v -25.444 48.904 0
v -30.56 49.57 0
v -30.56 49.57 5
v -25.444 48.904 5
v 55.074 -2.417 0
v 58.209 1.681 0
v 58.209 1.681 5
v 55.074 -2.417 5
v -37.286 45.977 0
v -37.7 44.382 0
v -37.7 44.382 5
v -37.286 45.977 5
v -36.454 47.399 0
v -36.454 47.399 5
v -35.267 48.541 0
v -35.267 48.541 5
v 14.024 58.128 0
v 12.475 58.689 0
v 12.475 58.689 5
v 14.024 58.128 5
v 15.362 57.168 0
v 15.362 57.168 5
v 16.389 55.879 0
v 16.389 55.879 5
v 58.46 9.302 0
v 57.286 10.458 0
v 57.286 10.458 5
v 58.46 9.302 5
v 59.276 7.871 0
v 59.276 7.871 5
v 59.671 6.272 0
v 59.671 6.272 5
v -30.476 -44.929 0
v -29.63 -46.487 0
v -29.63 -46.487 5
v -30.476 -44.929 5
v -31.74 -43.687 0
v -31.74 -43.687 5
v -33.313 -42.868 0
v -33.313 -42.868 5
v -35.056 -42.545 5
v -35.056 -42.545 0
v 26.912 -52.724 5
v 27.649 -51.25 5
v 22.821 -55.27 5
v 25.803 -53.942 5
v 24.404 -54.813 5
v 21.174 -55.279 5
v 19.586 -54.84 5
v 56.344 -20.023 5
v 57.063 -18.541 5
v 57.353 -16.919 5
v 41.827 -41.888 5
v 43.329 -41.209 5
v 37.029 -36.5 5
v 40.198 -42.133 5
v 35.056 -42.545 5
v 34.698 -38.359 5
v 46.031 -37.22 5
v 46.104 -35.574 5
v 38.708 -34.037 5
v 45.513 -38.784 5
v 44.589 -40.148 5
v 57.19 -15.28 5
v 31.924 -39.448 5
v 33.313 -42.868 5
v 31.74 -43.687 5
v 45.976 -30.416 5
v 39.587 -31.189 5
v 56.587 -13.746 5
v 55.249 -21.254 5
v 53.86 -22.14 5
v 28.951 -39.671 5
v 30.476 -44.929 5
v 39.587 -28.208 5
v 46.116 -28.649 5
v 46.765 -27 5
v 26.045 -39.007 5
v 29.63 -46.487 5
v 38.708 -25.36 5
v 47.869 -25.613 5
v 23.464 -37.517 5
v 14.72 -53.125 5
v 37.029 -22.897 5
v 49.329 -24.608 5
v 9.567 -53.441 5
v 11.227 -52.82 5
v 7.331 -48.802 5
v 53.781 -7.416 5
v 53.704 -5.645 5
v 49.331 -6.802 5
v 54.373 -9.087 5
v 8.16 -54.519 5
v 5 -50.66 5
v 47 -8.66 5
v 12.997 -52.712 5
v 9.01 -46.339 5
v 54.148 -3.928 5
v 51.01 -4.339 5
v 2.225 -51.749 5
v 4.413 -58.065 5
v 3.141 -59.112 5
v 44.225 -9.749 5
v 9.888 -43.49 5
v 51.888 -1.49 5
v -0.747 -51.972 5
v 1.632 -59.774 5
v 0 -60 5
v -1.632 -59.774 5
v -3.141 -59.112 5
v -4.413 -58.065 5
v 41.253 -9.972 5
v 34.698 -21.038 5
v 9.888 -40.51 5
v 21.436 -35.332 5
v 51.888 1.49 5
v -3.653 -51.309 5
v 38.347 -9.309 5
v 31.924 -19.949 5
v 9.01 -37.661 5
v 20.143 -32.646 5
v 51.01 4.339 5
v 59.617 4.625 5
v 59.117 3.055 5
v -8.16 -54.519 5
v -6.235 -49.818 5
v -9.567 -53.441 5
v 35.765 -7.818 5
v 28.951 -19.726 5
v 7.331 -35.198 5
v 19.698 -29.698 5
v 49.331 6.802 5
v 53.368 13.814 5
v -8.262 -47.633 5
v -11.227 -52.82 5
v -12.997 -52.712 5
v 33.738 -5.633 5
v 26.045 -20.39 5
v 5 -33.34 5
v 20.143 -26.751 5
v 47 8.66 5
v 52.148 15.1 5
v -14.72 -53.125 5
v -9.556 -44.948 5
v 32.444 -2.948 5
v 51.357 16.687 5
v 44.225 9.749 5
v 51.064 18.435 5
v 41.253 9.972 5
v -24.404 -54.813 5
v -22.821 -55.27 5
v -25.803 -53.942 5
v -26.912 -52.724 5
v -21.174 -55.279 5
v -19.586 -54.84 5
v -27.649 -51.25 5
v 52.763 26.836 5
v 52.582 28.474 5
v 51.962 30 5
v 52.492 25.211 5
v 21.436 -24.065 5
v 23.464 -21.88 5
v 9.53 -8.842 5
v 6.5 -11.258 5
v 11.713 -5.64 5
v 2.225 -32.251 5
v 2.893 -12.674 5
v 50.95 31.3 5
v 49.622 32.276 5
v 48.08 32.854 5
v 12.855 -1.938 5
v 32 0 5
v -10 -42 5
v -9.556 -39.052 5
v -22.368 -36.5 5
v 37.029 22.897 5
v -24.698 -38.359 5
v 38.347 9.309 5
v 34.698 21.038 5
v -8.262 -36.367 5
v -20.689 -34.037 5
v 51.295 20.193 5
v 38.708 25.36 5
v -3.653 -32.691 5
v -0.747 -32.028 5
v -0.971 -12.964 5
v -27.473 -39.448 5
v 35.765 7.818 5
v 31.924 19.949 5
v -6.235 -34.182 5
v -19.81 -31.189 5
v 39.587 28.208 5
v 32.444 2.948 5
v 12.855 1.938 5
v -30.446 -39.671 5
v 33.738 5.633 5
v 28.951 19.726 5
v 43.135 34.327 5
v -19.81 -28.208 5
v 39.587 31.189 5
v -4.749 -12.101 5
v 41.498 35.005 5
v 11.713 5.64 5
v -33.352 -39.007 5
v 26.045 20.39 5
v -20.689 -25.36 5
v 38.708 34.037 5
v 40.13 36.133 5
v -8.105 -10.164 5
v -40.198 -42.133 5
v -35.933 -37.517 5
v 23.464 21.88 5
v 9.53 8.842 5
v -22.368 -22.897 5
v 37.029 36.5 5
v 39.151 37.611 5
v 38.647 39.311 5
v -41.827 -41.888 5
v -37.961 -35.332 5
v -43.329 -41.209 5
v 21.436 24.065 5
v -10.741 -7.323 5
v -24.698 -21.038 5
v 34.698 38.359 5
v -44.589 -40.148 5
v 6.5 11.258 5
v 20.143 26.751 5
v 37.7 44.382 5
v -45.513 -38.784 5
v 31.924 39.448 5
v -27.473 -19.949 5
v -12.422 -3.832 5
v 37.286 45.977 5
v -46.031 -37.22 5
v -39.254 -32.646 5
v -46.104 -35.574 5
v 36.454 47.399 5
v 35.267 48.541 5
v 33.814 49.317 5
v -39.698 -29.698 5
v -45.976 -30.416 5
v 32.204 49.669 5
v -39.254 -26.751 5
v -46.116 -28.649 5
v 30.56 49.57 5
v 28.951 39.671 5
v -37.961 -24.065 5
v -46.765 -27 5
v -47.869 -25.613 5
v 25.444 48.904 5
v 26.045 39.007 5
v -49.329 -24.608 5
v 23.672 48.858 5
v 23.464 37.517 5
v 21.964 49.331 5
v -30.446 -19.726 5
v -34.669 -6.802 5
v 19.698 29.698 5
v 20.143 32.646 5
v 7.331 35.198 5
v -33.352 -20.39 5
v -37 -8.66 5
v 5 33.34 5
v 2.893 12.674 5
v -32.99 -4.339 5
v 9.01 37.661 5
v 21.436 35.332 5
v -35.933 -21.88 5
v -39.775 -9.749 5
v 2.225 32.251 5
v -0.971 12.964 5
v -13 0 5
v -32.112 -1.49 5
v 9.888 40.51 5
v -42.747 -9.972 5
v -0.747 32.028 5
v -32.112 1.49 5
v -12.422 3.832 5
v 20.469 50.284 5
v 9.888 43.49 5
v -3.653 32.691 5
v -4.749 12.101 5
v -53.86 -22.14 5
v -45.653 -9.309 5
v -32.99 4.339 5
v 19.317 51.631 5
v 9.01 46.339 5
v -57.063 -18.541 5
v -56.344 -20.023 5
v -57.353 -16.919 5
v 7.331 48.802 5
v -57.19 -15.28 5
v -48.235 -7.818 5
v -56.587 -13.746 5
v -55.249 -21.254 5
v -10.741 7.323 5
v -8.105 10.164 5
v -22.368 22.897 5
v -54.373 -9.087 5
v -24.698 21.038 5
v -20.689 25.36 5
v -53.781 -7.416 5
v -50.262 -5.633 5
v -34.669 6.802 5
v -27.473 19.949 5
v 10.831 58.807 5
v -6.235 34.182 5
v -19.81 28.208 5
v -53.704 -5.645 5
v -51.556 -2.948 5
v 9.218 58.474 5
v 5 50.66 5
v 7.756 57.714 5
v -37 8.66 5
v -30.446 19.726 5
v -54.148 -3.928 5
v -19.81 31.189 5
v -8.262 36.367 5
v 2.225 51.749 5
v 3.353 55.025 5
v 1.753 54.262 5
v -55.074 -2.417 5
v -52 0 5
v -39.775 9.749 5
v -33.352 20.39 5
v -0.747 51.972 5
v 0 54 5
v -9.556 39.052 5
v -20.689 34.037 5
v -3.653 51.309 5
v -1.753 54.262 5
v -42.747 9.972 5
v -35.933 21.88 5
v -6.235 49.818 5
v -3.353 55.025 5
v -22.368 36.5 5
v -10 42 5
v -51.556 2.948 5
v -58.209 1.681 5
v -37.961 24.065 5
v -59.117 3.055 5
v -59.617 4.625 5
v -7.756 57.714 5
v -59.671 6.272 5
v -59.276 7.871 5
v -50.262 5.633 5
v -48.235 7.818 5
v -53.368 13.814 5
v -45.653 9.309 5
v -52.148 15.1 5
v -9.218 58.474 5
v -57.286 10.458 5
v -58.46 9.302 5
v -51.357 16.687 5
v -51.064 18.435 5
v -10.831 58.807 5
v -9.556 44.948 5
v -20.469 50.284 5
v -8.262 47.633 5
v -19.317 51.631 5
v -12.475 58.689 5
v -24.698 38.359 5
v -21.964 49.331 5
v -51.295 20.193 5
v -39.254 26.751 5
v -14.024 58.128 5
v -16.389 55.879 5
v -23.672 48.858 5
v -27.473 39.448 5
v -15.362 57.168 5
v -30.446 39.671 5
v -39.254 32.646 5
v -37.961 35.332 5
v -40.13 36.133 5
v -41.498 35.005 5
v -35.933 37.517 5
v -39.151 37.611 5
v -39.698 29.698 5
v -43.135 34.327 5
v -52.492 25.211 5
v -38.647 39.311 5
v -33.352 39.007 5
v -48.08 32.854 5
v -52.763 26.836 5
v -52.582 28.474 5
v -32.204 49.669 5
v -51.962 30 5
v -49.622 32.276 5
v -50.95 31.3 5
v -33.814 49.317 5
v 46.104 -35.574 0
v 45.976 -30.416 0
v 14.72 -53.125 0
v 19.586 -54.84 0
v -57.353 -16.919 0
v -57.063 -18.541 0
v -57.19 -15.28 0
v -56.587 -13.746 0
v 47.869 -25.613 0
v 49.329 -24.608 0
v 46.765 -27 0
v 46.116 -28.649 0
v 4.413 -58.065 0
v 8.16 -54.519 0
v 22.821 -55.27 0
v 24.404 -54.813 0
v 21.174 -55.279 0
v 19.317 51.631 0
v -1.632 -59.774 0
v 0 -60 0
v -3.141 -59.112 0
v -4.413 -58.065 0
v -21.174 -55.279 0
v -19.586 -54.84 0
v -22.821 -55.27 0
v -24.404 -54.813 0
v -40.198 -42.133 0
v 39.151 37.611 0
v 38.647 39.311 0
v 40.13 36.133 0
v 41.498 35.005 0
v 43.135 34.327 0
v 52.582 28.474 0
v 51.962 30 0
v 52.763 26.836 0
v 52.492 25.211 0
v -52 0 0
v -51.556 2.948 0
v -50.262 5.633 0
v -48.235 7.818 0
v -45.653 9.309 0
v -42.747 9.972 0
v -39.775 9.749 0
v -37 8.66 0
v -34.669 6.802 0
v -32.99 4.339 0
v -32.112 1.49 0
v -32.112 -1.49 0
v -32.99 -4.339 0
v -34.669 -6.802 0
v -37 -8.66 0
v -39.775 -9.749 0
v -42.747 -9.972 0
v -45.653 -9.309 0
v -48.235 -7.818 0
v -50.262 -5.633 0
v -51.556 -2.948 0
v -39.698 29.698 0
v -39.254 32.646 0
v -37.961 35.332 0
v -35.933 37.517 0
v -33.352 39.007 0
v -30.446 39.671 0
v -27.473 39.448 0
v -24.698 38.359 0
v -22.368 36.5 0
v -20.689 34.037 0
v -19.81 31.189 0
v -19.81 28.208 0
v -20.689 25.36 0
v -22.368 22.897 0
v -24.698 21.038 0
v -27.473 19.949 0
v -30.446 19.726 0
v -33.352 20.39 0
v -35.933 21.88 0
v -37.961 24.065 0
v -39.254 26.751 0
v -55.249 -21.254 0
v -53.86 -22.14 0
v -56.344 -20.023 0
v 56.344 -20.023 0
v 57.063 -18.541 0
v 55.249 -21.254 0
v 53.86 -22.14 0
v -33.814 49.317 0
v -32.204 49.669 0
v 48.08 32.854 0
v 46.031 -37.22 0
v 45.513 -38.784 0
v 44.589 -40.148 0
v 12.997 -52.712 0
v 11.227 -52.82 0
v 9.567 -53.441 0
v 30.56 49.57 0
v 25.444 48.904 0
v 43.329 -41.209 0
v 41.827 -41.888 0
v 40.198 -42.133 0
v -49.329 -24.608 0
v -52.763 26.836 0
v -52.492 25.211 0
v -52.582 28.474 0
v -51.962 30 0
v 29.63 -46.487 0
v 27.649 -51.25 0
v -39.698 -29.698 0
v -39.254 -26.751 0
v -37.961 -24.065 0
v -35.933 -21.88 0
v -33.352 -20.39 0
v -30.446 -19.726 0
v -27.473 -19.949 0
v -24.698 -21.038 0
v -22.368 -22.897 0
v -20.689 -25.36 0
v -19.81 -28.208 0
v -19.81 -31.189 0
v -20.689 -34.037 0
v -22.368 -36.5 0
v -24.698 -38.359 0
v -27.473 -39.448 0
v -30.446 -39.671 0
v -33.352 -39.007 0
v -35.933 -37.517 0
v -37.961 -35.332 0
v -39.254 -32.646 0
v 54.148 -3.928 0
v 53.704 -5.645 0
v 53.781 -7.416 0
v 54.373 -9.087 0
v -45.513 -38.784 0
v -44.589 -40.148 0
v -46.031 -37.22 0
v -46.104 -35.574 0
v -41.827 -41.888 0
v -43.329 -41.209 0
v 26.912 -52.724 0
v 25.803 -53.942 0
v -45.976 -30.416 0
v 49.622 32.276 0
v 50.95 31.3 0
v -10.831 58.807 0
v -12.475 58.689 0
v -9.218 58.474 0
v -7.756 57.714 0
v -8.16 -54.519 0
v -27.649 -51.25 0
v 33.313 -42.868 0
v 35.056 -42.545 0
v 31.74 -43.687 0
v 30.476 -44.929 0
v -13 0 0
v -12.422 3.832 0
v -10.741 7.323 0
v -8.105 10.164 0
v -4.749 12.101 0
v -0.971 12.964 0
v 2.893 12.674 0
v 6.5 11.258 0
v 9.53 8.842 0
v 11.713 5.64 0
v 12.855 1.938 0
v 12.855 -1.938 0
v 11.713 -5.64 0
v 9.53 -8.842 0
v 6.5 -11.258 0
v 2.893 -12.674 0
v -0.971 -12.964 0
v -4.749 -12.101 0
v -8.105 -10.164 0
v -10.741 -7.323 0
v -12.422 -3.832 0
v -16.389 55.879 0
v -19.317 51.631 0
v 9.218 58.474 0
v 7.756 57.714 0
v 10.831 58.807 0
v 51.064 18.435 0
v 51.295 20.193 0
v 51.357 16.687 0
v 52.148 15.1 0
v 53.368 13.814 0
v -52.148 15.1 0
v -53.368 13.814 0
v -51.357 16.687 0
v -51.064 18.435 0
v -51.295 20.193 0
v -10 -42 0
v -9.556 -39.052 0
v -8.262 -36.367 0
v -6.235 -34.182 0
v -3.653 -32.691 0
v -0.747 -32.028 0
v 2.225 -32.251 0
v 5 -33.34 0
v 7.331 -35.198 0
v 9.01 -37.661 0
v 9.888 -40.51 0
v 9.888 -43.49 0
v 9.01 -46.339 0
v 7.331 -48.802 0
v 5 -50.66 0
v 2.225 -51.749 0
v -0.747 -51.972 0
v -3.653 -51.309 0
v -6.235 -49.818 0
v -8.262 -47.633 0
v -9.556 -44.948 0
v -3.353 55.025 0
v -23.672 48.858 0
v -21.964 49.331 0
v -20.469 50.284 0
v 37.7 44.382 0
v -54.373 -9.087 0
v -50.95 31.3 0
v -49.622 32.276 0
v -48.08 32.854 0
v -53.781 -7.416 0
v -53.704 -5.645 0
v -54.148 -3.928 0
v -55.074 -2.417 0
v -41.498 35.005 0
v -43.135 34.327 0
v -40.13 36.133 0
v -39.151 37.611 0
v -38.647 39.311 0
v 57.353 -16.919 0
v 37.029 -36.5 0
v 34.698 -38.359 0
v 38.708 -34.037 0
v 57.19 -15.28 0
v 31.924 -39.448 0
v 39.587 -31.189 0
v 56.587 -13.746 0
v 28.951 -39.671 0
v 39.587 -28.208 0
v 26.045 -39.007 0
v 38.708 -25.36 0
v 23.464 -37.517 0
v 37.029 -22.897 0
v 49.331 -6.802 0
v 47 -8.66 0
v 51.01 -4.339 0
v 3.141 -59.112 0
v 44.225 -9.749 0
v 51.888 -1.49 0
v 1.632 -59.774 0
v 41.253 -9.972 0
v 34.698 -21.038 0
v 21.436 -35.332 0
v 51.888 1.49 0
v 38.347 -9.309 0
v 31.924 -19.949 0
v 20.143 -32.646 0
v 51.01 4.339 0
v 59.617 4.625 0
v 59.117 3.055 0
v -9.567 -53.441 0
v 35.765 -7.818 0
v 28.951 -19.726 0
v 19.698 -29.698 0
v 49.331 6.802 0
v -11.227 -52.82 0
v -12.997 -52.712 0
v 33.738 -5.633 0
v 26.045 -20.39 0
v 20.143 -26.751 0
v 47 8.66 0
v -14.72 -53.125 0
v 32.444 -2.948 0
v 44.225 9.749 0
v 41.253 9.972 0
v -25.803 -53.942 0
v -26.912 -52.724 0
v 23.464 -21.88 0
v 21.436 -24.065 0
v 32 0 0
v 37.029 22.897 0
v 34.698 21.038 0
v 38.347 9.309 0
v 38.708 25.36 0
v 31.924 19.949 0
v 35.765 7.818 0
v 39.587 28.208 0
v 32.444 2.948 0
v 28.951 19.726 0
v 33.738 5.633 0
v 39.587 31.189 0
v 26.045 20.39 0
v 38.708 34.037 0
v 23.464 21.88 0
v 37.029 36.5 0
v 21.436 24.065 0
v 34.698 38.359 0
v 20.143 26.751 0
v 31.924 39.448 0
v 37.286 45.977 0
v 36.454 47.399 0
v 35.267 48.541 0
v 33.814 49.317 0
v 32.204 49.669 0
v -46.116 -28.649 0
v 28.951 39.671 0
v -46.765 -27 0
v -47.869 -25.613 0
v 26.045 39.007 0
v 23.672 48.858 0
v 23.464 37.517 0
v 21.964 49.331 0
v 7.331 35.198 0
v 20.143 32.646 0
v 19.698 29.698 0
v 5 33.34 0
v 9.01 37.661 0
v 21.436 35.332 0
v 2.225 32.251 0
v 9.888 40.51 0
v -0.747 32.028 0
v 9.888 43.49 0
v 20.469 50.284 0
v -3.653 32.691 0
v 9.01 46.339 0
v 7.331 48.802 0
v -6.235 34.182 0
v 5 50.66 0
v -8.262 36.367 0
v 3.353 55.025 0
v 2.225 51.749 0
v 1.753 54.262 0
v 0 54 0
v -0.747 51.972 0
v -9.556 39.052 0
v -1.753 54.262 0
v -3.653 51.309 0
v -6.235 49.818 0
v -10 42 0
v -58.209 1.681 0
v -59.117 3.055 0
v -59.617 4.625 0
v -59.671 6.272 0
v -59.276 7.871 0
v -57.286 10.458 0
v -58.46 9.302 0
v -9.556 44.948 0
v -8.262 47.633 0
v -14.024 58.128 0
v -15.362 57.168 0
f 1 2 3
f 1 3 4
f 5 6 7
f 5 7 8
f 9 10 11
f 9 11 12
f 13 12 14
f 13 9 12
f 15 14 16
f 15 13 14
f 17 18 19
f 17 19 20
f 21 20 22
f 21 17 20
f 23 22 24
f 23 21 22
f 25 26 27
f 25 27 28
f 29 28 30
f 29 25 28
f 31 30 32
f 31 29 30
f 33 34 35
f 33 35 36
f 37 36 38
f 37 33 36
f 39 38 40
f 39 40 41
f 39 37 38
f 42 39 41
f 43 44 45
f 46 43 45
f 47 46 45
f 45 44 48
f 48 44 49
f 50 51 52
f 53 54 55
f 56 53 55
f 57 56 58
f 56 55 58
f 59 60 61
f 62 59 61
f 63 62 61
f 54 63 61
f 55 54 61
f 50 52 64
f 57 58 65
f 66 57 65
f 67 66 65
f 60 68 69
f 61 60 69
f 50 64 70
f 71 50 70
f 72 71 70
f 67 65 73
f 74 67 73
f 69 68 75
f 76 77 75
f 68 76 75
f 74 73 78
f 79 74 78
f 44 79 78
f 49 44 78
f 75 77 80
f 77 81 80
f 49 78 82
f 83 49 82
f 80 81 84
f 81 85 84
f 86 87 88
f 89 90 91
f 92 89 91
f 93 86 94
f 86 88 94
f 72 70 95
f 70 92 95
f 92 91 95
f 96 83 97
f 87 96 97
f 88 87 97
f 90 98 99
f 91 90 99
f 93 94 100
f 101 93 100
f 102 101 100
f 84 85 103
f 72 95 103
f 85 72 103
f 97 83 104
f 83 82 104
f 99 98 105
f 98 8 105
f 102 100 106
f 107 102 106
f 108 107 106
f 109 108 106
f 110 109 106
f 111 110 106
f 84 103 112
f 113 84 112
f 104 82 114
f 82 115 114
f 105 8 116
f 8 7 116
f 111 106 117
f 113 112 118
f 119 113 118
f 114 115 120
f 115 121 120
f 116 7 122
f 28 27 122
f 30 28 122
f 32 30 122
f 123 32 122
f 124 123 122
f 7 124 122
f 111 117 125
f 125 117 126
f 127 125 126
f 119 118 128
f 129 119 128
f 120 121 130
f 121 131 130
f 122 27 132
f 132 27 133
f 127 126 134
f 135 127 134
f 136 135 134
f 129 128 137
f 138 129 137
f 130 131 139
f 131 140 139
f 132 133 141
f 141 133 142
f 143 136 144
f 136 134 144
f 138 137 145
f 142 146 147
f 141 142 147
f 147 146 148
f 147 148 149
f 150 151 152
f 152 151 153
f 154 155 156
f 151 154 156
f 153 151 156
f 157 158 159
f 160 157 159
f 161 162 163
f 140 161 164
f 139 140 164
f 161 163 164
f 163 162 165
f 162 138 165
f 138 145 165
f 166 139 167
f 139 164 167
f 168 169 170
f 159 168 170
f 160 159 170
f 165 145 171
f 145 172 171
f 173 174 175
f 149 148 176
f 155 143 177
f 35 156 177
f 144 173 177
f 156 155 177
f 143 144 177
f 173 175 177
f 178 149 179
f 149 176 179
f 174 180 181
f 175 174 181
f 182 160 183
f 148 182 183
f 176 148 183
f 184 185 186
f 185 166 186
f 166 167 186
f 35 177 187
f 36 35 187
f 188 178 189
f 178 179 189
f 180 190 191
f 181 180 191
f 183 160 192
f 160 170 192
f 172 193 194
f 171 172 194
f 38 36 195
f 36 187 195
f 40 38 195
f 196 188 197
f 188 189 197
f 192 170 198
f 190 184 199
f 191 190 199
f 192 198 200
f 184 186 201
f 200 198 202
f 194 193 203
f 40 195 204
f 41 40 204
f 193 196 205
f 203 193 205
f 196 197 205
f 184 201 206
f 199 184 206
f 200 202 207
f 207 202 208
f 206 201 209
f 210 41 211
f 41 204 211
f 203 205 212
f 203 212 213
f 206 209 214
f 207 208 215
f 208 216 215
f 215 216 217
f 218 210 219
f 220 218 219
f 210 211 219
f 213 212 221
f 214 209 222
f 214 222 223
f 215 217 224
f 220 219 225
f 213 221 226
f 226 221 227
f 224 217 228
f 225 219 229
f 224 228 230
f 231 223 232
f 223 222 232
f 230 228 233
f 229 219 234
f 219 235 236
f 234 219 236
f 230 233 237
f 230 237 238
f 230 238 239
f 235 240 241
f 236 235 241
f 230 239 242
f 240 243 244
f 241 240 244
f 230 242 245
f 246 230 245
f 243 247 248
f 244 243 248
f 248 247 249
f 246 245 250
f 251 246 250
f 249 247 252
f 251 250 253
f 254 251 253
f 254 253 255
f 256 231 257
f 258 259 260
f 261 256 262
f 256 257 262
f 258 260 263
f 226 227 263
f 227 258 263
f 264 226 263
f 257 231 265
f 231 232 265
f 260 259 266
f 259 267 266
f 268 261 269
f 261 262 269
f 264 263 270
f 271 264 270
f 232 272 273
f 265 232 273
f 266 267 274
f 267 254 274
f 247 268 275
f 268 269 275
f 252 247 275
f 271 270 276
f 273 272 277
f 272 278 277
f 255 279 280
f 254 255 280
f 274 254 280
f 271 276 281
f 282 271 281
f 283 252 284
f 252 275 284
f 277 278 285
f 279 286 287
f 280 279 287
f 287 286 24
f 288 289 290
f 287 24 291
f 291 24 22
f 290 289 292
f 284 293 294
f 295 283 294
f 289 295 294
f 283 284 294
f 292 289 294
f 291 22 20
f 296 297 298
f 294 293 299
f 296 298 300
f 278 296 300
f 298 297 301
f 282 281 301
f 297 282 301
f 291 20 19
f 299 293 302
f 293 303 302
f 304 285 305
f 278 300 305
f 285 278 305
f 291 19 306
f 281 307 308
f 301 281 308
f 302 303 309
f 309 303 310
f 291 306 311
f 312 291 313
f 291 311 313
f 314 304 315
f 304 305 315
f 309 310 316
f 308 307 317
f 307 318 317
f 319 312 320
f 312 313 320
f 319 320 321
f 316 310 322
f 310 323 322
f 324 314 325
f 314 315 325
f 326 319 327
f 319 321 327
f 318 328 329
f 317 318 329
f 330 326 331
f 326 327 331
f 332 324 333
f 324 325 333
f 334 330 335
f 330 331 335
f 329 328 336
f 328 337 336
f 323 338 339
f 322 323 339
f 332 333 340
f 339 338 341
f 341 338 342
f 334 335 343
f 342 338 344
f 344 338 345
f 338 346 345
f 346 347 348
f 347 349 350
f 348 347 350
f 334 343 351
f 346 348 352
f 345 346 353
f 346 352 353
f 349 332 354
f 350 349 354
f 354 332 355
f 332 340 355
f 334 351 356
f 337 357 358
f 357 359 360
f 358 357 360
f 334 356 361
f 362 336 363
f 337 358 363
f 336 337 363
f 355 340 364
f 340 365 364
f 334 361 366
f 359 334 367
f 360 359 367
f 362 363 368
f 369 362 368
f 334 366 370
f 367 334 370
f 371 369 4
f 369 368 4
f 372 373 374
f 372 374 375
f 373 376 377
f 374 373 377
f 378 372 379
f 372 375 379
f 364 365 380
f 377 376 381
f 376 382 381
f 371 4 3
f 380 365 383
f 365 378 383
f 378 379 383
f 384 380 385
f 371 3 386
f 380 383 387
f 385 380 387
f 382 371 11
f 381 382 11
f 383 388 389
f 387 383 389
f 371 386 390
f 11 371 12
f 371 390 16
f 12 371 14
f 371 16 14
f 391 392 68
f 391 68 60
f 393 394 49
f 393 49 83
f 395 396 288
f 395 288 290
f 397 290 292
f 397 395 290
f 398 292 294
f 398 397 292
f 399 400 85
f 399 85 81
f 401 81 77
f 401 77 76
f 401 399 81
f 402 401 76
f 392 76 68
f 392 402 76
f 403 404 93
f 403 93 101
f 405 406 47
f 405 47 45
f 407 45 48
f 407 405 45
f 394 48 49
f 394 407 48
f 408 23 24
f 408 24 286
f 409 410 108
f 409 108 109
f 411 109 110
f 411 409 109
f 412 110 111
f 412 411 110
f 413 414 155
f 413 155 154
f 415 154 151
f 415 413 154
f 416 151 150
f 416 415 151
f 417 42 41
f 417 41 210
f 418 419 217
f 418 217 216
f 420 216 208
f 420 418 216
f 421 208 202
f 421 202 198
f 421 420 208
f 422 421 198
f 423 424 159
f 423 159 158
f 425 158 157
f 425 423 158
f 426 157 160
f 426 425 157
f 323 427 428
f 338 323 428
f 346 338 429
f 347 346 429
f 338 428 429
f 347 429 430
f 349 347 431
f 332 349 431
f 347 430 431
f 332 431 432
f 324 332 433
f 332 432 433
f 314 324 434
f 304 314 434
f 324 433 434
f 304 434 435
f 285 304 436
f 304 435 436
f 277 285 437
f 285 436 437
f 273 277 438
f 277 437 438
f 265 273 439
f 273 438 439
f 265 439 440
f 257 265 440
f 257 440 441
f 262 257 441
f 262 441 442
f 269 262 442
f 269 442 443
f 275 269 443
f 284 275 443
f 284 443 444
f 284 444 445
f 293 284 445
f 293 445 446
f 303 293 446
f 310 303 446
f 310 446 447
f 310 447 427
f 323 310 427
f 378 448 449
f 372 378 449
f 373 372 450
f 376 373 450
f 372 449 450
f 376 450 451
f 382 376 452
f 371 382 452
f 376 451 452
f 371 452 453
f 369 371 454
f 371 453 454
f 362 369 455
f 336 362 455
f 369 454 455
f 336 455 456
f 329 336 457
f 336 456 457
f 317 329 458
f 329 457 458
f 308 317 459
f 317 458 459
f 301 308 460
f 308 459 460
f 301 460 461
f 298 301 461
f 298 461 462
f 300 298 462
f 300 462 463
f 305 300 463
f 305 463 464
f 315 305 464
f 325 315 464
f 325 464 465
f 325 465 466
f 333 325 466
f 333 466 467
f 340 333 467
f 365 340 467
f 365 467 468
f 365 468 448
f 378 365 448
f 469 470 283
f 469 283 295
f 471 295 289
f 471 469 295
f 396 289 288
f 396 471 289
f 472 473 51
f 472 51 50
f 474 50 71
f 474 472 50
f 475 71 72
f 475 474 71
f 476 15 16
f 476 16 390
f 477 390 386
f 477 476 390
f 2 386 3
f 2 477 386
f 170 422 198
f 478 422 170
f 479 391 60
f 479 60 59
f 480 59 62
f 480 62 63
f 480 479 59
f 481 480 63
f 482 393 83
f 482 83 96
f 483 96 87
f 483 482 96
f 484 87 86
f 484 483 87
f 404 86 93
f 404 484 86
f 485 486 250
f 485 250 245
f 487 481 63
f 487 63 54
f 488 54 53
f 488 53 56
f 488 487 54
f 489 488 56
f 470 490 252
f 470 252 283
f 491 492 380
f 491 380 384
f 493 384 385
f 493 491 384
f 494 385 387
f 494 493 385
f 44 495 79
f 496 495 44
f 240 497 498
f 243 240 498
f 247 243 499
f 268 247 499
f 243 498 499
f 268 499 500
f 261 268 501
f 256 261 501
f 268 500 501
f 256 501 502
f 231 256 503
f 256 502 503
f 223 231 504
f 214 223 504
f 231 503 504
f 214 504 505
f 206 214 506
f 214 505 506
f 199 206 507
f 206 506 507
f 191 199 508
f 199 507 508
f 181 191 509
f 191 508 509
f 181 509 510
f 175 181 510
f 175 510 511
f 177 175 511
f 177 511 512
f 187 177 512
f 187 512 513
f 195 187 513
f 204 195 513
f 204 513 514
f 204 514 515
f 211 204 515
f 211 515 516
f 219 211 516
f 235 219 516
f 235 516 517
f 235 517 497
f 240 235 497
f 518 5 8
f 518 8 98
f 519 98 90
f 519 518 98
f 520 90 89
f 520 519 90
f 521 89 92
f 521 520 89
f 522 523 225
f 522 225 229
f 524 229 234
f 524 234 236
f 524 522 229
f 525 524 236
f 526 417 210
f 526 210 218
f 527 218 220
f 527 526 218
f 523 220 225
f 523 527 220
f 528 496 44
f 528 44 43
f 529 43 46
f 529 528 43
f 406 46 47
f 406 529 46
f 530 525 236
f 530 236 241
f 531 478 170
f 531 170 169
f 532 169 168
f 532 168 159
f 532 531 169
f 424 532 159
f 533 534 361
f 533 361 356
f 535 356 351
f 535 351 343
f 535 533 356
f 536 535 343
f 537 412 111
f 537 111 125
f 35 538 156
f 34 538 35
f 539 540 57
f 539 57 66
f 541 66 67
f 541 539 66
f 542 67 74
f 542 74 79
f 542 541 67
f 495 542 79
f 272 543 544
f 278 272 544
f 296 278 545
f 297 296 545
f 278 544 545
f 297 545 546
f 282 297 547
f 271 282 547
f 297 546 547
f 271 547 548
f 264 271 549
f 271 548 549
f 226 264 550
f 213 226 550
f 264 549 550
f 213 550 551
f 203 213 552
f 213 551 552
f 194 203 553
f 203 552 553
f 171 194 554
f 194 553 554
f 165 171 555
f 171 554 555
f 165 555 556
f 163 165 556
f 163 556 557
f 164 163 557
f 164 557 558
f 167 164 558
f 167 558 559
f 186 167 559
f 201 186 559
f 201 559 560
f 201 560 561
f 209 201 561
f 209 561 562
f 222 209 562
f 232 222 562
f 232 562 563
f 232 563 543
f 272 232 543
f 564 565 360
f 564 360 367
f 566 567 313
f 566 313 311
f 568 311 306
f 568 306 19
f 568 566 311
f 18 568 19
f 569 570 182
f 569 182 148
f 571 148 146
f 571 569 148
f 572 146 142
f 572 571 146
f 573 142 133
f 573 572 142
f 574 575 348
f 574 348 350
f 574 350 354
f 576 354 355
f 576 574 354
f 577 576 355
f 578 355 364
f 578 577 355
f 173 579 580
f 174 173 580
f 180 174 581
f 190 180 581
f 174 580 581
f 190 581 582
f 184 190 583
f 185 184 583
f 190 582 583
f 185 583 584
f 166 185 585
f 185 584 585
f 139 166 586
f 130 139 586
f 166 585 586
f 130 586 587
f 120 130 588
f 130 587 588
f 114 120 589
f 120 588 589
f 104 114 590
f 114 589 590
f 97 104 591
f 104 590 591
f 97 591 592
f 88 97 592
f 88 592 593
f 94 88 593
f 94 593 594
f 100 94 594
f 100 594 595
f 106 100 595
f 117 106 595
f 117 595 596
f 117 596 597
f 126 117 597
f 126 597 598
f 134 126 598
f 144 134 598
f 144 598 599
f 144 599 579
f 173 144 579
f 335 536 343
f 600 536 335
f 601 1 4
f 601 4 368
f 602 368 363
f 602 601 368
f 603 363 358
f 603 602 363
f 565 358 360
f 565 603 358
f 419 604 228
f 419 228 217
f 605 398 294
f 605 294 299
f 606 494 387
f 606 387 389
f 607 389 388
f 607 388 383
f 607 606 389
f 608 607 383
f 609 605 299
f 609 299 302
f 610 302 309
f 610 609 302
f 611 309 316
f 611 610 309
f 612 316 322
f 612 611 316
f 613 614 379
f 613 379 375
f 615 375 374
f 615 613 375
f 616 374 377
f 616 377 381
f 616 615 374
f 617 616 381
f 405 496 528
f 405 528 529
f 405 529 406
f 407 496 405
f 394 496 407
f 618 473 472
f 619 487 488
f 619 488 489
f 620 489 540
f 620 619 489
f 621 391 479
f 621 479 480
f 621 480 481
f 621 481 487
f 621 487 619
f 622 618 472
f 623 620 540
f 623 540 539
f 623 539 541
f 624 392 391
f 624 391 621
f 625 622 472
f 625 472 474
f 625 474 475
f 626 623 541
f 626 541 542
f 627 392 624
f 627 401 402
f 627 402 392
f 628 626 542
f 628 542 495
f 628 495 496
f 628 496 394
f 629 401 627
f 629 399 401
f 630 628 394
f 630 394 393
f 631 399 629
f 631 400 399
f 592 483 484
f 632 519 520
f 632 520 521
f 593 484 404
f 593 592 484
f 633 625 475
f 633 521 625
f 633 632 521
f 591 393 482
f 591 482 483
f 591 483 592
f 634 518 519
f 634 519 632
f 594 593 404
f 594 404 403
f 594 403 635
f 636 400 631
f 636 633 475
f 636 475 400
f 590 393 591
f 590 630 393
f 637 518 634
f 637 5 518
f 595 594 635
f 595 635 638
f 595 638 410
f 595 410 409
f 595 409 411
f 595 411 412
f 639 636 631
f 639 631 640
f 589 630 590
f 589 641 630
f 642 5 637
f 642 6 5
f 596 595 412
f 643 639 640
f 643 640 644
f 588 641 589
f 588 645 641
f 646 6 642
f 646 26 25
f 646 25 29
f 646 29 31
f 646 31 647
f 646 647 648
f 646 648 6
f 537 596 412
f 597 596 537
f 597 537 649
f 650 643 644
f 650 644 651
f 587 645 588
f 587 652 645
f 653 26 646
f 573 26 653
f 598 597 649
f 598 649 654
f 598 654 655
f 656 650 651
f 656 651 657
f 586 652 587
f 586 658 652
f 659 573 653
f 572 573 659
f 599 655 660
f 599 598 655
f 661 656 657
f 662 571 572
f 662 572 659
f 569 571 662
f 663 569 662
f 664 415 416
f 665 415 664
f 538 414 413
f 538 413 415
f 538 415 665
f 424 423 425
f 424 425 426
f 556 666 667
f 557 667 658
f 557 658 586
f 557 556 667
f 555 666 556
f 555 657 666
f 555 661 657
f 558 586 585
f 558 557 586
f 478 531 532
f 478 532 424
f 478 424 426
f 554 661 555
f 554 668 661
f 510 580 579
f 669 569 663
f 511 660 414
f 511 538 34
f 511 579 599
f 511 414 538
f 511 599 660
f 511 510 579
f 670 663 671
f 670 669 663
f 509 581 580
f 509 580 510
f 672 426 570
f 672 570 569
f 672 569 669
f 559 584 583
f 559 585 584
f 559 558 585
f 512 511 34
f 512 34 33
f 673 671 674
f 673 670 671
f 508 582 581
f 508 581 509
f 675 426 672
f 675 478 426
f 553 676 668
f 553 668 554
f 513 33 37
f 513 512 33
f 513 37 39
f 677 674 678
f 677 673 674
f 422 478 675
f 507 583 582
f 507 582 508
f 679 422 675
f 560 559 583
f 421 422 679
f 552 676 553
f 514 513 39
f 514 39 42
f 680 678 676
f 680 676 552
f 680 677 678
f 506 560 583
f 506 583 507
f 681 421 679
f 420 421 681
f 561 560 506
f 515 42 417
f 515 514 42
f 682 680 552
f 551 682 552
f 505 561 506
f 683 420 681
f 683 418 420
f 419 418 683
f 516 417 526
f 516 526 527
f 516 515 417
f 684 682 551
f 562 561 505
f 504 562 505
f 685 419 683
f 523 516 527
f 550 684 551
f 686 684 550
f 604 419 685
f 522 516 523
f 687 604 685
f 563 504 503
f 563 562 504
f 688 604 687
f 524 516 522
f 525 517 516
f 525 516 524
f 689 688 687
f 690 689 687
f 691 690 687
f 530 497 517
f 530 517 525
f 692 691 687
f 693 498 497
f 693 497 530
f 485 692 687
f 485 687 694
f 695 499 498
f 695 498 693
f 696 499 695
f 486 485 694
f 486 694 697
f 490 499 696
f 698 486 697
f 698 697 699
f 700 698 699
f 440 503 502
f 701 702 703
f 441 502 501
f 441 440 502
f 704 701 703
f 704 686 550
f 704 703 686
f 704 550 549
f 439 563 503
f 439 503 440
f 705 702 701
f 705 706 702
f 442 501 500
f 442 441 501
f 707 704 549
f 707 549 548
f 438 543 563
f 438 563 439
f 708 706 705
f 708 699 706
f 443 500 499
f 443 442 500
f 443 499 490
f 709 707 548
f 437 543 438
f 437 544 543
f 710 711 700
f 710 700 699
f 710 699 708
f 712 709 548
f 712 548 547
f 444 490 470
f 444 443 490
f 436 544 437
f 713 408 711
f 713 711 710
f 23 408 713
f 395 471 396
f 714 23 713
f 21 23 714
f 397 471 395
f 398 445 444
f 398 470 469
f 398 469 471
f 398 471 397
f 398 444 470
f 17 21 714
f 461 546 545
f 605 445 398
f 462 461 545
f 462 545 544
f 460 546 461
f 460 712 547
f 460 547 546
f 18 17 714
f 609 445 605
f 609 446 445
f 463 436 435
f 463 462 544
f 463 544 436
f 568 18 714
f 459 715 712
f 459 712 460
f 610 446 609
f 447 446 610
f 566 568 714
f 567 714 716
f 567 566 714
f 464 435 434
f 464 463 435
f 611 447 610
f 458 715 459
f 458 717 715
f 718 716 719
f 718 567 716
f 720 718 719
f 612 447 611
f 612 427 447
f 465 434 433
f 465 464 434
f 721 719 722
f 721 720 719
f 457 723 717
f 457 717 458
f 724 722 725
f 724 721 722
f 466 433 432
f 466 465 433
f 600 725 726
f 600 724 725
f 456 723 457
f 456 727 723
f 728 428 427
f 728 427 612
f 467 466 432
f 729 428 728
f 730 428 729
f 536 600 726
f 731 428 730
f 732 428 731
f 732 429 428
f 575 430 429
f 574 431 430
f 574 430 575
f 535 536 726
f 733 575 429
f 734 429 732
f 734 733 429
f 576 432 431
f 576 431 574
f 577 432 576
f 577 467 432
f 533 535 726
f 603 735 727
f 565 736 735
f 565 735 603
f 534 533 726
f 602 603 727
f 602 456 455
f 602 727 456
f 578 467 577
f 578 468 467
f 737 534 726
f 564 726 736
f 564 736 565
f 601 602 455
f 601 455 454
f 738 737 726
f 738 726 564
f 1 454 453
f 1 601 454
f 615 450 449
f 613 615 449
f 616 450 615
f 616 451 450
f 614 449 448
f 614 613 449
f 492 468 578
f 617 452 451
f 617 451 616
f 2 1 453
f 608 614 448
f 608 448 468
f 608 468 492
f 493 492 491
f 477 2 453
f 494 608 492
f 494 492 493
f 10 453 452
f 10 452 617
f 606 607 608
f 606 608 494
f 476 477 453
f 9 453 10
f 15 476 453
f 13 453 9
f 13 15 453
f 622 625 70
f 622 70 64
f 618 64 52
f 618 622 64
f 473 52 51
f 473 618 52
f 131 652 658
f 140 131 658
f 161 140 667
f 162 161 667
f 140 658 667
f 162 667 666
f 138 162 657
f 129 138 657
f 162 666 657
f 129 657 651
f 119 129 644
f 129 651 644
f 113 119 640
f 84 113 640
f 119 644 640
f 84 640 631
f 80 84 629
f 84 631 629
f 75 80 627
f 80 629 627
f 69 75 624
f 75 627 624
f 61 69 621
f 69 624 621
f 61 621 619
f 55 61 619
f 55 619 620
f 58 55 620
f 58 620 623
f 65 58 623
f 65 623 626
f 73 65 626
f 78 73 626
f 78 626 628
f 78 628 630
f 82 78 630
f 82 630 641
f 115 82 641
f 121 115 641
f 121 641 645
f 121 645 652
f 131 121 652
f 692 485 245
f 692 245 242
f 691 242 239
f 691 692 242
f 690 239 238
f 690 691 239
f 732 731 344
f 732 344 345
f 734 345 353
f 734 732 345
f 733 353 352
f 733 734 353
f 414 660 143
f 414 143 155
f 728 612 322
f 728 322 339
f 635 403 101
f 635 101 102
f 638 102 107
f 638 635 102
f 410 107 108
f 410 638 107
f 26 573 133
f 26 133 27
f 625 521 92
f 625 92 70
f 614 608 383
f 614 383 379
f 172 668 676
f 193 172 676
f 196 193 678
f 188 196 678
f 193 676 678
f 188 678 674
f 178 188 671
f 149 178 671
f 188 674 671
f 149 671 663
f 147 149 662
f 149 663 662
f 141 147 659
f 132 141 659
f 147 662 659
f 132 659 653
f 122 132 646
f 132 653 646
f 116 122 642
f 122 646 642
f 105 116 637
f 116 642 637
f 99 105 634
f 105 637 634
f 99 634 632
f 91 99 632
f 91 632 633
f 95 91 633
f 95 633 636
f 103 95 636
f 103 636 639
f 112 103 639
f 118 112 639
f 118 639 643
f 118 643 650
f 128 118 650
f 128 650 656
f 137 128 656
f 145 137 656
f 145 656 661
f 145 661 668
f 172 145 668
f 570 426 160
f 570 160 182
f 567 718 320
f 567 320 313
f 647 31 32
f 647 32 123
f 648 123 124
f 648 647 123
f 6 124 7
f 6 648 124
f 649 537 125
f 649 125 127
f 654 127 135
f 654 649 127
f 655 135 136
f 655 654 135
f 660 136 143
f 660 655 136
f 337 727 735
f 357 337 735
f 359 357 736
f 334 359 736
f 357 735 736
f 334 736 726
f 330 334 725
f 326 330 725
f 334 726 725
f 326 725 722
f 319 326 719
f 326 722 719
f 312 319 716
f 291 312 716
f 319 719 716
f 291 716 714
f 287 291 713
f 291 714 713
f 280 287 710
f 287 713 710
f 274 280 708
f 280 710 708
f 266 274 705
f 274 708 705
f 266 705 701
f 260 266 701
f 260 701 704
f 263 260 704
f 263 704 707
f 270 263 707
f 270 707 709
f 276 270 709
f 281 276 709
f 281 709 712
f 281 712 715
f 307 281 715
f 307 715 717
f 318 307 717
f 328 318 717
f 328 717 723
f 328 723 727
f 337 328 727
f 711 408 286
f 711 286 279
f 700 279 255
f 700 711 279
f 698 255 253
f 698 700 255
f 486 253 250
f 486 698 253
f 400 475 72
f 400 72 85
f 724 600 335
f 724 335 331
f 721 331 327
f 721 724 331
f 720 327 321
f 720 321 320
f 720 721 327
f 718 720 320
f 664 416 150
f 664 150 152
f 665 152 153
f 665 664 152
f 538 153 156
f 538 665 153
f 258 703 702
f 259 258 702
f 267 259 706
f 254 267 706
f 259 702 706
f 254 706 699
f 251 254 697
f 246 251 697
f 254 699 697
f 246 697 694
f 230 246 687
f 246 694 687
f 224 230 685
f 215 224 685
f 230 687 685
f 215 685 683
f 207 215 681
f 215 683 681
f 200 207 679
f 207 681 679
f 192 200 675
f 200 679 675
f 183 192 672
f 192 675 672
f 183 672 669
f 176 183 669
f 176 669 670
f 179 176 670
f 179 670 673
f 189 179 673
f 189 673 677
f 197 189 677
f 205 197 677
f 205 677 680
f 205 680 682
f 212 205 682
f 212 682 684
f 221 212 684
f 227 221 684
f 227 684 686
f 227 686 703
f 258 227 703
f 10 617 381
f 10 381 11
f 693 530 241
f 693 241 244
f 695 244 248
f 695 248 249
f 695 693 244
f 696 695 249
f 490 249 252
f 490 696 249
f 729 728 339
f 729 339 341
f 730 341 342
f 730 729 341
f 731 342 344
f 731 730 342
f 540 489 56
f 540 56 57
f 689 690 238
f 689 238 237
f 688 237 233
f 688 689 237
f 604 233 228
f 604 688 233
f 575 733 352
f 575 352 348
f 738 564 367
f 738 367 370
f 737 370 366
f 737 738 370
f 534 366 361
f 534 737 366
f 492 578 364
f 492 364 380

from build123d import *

# Parameters (mm, degrees)
BOSS_EXTRU_1_DEPTH      = 5
ESQUISSE2_R             = 13
ESQUISSE2_R_2           = 10
ENL_V_MAT_EXTRU_1_DEPTH = 85.791446444


with BuildPart() as part:
    # Esquisse1 → Boss.-Extru.1 (new body)
    with BuildSketch(Plane.XY):
        with BuildLine():
            Line((-7.756063007, 57.713945373), (-3.353460657, 55.024630504))
            ThreePointArc((-3.353460657, 55.024630504), (0, 54), (3.353460657, 55.024630504))
            Line((3.353460657, 55.024630504), (7.756063007, 57.713945373))
            ThreePointArc((7.756063007, 57.713945373), (10.013220978, 58.695868578), (12.474701449, 58.688856044))
            ThreePointArc((12.474701449, 58.688856044), (14.726228007, 57.694088008), (16.388860271, 55.878987669))
            Line((16.388860271, 55.878987669), (19.316994747, 51.631476586))
            ThreePointArc((19.316994747, 51.631476586), (21.963778726, 49.331454713), (25.444072249, 48.903525925))
            Line((25.444072249, 48.903525925), (30.559892529, 49.569637607))
            ThreePointArc((30.559892529, 49.569637607), (33.021293088, 49.548600235), (35.267115138, 48.541019662))
            ThreePointArc((35.267115138, 48.541019662), (36.919378386, 46.716475488), (37.700000719, 44.382045352))
            Line((37.700000719, 44.382045352), (38.64736627, 39.310771309))
            ThreePointArc((38.64736627, 39.310771309), (40.129820576, 36.133052743), (43.135172596, 34.326557439))
            Line((43.135172596, 34.326557439), (48.079639004, 32.854289173))
            ThreePointArc((48.079639004, 32.854289173), (50.319683635, 31.833928776), (51.961524227, 30))
            ThreePointArc((51.961524227, 30), (52.72883284, 27.66115995), (52.49246855, 25.211044196))
            Line((52.49246855, 25.211044196), (51.295257065, 20.192876545))
            ThreePointArc((51.295257065, 20.192876545), (51.35705188, 16.686917696), (53.367809731, 13.814215325))
            Line((53.367809731, 13.814215325), (57.285979107, 10.45813567))
            ThreePointArc((57.285979107, 10.45813567), (58.917343741, 8.61488183), (59.671313722, 6.271707796))
            ThreePointArc((59.671313722, 6.271707796), (59.420993069, 3.822978563), (58.208511689, 1.680824463))
            Line((58.208511689, 1.680824463), (55.07373191, -2.416550019))
            ThreePointArc((55.07373191, -2.416550019), (53.70418235, -5.644537016), (54.372667732, -9.086730118))
            Line((54.372667732, -9.086730118), (56.587052995, -13.746324501))
            ThreePointArc((56.587052995, -13.746324501), (57.327659867, -16.093756448), (57.063390978, -18.541019662))
            ThreePointArc((57.063390978, -18.541019662), (55.838723774, -20.676230548), (53.859774349, -22.14002509))
            Line((53.859774349, -22.14002509), (49.329458179, -24.608133132))
            ThreePointArc((49.329458179, -24.608133132), (46.765371804, -27), (45.975997522, -30.416497372))
            Line((45.975997522, -30.416497372), (46.103711342, -35.573920284))
            ThreePointArc((46.103711342, -35.573920284), (45.825502796, -38.019638029), (44.588689529, -40.147836382))
            ThreePointArc((44.588689529, -40.147836382), (42.60143186, -41.60033156), (40.198192724, -42.132663168))
            Line((40.198192724, -42.132663168), (35.055672985, -42.544746469))
            ThreePointArc((35.055672985, -42.544746469), (31.740403624, -43.686917696), (29.629659661, -46.486975906))
            Line((29.629659661, -46.486975906), (27.64861916, -51.25046207))
            ThreePointArc((27.64861916, -51.25046207), (26.399699981, -53.371578798), (24.404198585, -54.812727459))
            ThreePointArc((24.404198585, -54.812727459), (21.997965355, -55.331357318), (19.585978387, -54.840181022))
            Line((19.585978387, -54.840181022), (14.720443461, -53.124986634))
            ThreePointArc((14.720443461, -53.124986634), (11.227231304, -52.81997044), (8.160084469, -54.519433984))
            Line((8.160084469, -54.519433984), (4.412829545, -58.065333369))
            ThreePointArc((4.412829545, -58.065333369), (2.409149205, -59.495088726), (0, -60))
            ThreePointArc((0, -60), (-2.409149205, -59.495088726), (-4.412829545, -58.065333369))
            Line((-4.412829545, -58.065333369), (-8.160084469, -54.519433984))
            ThreePointArc((-8.160084469, -54.519433984), (-11.227231304, -52.81997044), (-14.720443461, -53.124986634))
            Line((-14.720443461, -53.124986634), (-19.585978387, -54.840181022))
            ThreePointArc((-19.585978387, -54.840181022), (-21.997965355, -55.331357318), (-24.404198585, -54.812727459))
            ThreePointArc((-24.404198585, -54.812727459), (-26.399699981, -53.371578798), (-27.64861916, -51.25046207))
            Line((-27.64861916, -51.25046207), (-29.629659661, -46.486975906))
            ThreePointArc((-29.629659661, -46.486975906), (-31.740403624, -43.686917696), (-35.055672985, -42.544746469))
            Line((-35.055672985, -42.544746469), (-40.198192724, -42.132663168))
            ThreePointArc((-40.198192724, -42.132663168), (-42.60143186, -41.60033156), (-44.588689529, -40.147836382))
            ThreePointArc((-44.588689529, -40.147836382), (-45.825502796, -38.019638029), (-46.103711342, -35.573920284))
            Line((-46.103711342, -35.573920284), (-45.975997522, -30.416497372))
            ThreePointArc((-45.975997522, -30.416497372), (-46.765371804, -27), (-49.329458179, -24.608133132))
            Line((-49.329458179, -24.608133132), (-53.859774349, -22.14002509))
            ThreePointArc((-53.859774349, -22.14002509), (-55.838723774, -20.676230548), (-57.063390978, -18.541019662))
            ThreePointArc((-57.063390978, -18.541019662), (-57.327659867, -16.093756448), (-56.587052995, -13.746324501))
            Line((-56.587052995, -13.746324501), (-54.372667732, -9.086730118))
            ThreePointArc((-54.372667732, -9.086730118), (-53.70418235, -5.644537016), (-55.07373191, -2.416550019))
            Line((-55.07373191, -2.416550019), (-58.208511689, 1.680824463))
            ThreePointArc((-58.208511689, 1.680824463), (-59.420993069, 3.822978563), (-59.671313722, 6.271707796))
            ThreePointArc((-59.671313722, 6.271707796), (-58.917343741, 8.61488183), (-57.285979107, 10.45813567))
            Line((-57.285979107, 10.45813567), (-53.367809731, 13.814215325))
            ThreePointArc((-53.367809731, 13.814215325), (-51.35705188, 16.686917696), (-51.295257065, 20.192876545))
            Line((-51.295257065, 20.192876545), (-52.49246855, 25.211044196))
            ThreePointArc((-52.49246855, 25.211044196), (-52.72883284, 27.66115995), (-51.961524227, 30))
            ThreePointArc((-51.961524227, 30), (-50.319683635, 31.833928776), (-48.079639004, 32.854289173))
            Line((-48.079639004, 32.854289173), (-43.135172596, 34.326557439))
            ThreePointArc((-43.135172596, 34.326557439), (-40.129820576, 36.133052743), (-38.64736627, 39.310771309))
            Line((-38.64736627, 39.310771309), (-37.700000719, 44.382045352))
            ThreePointArc((-37.700000719, 44.382045352), (-36.919378386, 46.716475488), (-35.267115138, 48.541019662))
            ThreePointArc((-35.267115138, 48.541019662), (-33.021293088, 49.548600235), (-30.559892529, 49.569637607))
            Line((-30.559892529, 49.569637607), (-25.444072249, 48.903525925))
            ThreePointArc((-25.444072249, 48.903525925), (-21.963778726, 49.331454713), (-19.316994747, 51.631476586))
            Line((-19.316994747, 51.631476586), (-16.388860271, 55.878987669))
            ThreePointArc((-16.388860271, 55.878987669), (-14.726228007, 57.694088008), (-12.474701449, 58.688856044))
            ThreePointArc((-12.474701449, 58.688856044), (-10.013220978, 58.695868578), (-7.756063007, 57.713945373))
        make_face()
    extrude(amount=BOSS_EXTRU_1_DEPTH)

    # Esquisse2 → Enlèv. mat.-Extru.1 (cut, through all)
    with BuildSketch(Plane(origin=(0, 0, 0), x_dir=(-1, 0, 0), z_dir=(0, 0, -1))):
        Circle(ESQUISSE2_R)
        with Locations((0, 42)):
            Circle(ESQUISSE2_R_2)
        with Locations((29.69848481, 29.69848481)):
            Circle(ESQUISSE2_R_2)
        with Locations((42, 0)):
            Circle(ESQUISSE2_R_2)
        with Locations((29.69848481, -29.69848481)):
            Circle(ESQUISSE2_R_2)
        with Locations((0, -42)):
            Circle(ESQUISSE2_R_2)
        with Locations((-29.69848481, -29.69848481)):
            Circle(ESQUISSE2_R_2)
        with Locations((-42, 0)):
            Circle(ESQUISSE2_R_2)
        with Locations((-29.69848481, 29.69848481)):
            Circle(ESQUISSE2_R_2)
    extrude(amount=-ENL_V_MAT_EXTRU_1_DEPTH, mode=Mode.SUBTRACT)


solid = part.part
